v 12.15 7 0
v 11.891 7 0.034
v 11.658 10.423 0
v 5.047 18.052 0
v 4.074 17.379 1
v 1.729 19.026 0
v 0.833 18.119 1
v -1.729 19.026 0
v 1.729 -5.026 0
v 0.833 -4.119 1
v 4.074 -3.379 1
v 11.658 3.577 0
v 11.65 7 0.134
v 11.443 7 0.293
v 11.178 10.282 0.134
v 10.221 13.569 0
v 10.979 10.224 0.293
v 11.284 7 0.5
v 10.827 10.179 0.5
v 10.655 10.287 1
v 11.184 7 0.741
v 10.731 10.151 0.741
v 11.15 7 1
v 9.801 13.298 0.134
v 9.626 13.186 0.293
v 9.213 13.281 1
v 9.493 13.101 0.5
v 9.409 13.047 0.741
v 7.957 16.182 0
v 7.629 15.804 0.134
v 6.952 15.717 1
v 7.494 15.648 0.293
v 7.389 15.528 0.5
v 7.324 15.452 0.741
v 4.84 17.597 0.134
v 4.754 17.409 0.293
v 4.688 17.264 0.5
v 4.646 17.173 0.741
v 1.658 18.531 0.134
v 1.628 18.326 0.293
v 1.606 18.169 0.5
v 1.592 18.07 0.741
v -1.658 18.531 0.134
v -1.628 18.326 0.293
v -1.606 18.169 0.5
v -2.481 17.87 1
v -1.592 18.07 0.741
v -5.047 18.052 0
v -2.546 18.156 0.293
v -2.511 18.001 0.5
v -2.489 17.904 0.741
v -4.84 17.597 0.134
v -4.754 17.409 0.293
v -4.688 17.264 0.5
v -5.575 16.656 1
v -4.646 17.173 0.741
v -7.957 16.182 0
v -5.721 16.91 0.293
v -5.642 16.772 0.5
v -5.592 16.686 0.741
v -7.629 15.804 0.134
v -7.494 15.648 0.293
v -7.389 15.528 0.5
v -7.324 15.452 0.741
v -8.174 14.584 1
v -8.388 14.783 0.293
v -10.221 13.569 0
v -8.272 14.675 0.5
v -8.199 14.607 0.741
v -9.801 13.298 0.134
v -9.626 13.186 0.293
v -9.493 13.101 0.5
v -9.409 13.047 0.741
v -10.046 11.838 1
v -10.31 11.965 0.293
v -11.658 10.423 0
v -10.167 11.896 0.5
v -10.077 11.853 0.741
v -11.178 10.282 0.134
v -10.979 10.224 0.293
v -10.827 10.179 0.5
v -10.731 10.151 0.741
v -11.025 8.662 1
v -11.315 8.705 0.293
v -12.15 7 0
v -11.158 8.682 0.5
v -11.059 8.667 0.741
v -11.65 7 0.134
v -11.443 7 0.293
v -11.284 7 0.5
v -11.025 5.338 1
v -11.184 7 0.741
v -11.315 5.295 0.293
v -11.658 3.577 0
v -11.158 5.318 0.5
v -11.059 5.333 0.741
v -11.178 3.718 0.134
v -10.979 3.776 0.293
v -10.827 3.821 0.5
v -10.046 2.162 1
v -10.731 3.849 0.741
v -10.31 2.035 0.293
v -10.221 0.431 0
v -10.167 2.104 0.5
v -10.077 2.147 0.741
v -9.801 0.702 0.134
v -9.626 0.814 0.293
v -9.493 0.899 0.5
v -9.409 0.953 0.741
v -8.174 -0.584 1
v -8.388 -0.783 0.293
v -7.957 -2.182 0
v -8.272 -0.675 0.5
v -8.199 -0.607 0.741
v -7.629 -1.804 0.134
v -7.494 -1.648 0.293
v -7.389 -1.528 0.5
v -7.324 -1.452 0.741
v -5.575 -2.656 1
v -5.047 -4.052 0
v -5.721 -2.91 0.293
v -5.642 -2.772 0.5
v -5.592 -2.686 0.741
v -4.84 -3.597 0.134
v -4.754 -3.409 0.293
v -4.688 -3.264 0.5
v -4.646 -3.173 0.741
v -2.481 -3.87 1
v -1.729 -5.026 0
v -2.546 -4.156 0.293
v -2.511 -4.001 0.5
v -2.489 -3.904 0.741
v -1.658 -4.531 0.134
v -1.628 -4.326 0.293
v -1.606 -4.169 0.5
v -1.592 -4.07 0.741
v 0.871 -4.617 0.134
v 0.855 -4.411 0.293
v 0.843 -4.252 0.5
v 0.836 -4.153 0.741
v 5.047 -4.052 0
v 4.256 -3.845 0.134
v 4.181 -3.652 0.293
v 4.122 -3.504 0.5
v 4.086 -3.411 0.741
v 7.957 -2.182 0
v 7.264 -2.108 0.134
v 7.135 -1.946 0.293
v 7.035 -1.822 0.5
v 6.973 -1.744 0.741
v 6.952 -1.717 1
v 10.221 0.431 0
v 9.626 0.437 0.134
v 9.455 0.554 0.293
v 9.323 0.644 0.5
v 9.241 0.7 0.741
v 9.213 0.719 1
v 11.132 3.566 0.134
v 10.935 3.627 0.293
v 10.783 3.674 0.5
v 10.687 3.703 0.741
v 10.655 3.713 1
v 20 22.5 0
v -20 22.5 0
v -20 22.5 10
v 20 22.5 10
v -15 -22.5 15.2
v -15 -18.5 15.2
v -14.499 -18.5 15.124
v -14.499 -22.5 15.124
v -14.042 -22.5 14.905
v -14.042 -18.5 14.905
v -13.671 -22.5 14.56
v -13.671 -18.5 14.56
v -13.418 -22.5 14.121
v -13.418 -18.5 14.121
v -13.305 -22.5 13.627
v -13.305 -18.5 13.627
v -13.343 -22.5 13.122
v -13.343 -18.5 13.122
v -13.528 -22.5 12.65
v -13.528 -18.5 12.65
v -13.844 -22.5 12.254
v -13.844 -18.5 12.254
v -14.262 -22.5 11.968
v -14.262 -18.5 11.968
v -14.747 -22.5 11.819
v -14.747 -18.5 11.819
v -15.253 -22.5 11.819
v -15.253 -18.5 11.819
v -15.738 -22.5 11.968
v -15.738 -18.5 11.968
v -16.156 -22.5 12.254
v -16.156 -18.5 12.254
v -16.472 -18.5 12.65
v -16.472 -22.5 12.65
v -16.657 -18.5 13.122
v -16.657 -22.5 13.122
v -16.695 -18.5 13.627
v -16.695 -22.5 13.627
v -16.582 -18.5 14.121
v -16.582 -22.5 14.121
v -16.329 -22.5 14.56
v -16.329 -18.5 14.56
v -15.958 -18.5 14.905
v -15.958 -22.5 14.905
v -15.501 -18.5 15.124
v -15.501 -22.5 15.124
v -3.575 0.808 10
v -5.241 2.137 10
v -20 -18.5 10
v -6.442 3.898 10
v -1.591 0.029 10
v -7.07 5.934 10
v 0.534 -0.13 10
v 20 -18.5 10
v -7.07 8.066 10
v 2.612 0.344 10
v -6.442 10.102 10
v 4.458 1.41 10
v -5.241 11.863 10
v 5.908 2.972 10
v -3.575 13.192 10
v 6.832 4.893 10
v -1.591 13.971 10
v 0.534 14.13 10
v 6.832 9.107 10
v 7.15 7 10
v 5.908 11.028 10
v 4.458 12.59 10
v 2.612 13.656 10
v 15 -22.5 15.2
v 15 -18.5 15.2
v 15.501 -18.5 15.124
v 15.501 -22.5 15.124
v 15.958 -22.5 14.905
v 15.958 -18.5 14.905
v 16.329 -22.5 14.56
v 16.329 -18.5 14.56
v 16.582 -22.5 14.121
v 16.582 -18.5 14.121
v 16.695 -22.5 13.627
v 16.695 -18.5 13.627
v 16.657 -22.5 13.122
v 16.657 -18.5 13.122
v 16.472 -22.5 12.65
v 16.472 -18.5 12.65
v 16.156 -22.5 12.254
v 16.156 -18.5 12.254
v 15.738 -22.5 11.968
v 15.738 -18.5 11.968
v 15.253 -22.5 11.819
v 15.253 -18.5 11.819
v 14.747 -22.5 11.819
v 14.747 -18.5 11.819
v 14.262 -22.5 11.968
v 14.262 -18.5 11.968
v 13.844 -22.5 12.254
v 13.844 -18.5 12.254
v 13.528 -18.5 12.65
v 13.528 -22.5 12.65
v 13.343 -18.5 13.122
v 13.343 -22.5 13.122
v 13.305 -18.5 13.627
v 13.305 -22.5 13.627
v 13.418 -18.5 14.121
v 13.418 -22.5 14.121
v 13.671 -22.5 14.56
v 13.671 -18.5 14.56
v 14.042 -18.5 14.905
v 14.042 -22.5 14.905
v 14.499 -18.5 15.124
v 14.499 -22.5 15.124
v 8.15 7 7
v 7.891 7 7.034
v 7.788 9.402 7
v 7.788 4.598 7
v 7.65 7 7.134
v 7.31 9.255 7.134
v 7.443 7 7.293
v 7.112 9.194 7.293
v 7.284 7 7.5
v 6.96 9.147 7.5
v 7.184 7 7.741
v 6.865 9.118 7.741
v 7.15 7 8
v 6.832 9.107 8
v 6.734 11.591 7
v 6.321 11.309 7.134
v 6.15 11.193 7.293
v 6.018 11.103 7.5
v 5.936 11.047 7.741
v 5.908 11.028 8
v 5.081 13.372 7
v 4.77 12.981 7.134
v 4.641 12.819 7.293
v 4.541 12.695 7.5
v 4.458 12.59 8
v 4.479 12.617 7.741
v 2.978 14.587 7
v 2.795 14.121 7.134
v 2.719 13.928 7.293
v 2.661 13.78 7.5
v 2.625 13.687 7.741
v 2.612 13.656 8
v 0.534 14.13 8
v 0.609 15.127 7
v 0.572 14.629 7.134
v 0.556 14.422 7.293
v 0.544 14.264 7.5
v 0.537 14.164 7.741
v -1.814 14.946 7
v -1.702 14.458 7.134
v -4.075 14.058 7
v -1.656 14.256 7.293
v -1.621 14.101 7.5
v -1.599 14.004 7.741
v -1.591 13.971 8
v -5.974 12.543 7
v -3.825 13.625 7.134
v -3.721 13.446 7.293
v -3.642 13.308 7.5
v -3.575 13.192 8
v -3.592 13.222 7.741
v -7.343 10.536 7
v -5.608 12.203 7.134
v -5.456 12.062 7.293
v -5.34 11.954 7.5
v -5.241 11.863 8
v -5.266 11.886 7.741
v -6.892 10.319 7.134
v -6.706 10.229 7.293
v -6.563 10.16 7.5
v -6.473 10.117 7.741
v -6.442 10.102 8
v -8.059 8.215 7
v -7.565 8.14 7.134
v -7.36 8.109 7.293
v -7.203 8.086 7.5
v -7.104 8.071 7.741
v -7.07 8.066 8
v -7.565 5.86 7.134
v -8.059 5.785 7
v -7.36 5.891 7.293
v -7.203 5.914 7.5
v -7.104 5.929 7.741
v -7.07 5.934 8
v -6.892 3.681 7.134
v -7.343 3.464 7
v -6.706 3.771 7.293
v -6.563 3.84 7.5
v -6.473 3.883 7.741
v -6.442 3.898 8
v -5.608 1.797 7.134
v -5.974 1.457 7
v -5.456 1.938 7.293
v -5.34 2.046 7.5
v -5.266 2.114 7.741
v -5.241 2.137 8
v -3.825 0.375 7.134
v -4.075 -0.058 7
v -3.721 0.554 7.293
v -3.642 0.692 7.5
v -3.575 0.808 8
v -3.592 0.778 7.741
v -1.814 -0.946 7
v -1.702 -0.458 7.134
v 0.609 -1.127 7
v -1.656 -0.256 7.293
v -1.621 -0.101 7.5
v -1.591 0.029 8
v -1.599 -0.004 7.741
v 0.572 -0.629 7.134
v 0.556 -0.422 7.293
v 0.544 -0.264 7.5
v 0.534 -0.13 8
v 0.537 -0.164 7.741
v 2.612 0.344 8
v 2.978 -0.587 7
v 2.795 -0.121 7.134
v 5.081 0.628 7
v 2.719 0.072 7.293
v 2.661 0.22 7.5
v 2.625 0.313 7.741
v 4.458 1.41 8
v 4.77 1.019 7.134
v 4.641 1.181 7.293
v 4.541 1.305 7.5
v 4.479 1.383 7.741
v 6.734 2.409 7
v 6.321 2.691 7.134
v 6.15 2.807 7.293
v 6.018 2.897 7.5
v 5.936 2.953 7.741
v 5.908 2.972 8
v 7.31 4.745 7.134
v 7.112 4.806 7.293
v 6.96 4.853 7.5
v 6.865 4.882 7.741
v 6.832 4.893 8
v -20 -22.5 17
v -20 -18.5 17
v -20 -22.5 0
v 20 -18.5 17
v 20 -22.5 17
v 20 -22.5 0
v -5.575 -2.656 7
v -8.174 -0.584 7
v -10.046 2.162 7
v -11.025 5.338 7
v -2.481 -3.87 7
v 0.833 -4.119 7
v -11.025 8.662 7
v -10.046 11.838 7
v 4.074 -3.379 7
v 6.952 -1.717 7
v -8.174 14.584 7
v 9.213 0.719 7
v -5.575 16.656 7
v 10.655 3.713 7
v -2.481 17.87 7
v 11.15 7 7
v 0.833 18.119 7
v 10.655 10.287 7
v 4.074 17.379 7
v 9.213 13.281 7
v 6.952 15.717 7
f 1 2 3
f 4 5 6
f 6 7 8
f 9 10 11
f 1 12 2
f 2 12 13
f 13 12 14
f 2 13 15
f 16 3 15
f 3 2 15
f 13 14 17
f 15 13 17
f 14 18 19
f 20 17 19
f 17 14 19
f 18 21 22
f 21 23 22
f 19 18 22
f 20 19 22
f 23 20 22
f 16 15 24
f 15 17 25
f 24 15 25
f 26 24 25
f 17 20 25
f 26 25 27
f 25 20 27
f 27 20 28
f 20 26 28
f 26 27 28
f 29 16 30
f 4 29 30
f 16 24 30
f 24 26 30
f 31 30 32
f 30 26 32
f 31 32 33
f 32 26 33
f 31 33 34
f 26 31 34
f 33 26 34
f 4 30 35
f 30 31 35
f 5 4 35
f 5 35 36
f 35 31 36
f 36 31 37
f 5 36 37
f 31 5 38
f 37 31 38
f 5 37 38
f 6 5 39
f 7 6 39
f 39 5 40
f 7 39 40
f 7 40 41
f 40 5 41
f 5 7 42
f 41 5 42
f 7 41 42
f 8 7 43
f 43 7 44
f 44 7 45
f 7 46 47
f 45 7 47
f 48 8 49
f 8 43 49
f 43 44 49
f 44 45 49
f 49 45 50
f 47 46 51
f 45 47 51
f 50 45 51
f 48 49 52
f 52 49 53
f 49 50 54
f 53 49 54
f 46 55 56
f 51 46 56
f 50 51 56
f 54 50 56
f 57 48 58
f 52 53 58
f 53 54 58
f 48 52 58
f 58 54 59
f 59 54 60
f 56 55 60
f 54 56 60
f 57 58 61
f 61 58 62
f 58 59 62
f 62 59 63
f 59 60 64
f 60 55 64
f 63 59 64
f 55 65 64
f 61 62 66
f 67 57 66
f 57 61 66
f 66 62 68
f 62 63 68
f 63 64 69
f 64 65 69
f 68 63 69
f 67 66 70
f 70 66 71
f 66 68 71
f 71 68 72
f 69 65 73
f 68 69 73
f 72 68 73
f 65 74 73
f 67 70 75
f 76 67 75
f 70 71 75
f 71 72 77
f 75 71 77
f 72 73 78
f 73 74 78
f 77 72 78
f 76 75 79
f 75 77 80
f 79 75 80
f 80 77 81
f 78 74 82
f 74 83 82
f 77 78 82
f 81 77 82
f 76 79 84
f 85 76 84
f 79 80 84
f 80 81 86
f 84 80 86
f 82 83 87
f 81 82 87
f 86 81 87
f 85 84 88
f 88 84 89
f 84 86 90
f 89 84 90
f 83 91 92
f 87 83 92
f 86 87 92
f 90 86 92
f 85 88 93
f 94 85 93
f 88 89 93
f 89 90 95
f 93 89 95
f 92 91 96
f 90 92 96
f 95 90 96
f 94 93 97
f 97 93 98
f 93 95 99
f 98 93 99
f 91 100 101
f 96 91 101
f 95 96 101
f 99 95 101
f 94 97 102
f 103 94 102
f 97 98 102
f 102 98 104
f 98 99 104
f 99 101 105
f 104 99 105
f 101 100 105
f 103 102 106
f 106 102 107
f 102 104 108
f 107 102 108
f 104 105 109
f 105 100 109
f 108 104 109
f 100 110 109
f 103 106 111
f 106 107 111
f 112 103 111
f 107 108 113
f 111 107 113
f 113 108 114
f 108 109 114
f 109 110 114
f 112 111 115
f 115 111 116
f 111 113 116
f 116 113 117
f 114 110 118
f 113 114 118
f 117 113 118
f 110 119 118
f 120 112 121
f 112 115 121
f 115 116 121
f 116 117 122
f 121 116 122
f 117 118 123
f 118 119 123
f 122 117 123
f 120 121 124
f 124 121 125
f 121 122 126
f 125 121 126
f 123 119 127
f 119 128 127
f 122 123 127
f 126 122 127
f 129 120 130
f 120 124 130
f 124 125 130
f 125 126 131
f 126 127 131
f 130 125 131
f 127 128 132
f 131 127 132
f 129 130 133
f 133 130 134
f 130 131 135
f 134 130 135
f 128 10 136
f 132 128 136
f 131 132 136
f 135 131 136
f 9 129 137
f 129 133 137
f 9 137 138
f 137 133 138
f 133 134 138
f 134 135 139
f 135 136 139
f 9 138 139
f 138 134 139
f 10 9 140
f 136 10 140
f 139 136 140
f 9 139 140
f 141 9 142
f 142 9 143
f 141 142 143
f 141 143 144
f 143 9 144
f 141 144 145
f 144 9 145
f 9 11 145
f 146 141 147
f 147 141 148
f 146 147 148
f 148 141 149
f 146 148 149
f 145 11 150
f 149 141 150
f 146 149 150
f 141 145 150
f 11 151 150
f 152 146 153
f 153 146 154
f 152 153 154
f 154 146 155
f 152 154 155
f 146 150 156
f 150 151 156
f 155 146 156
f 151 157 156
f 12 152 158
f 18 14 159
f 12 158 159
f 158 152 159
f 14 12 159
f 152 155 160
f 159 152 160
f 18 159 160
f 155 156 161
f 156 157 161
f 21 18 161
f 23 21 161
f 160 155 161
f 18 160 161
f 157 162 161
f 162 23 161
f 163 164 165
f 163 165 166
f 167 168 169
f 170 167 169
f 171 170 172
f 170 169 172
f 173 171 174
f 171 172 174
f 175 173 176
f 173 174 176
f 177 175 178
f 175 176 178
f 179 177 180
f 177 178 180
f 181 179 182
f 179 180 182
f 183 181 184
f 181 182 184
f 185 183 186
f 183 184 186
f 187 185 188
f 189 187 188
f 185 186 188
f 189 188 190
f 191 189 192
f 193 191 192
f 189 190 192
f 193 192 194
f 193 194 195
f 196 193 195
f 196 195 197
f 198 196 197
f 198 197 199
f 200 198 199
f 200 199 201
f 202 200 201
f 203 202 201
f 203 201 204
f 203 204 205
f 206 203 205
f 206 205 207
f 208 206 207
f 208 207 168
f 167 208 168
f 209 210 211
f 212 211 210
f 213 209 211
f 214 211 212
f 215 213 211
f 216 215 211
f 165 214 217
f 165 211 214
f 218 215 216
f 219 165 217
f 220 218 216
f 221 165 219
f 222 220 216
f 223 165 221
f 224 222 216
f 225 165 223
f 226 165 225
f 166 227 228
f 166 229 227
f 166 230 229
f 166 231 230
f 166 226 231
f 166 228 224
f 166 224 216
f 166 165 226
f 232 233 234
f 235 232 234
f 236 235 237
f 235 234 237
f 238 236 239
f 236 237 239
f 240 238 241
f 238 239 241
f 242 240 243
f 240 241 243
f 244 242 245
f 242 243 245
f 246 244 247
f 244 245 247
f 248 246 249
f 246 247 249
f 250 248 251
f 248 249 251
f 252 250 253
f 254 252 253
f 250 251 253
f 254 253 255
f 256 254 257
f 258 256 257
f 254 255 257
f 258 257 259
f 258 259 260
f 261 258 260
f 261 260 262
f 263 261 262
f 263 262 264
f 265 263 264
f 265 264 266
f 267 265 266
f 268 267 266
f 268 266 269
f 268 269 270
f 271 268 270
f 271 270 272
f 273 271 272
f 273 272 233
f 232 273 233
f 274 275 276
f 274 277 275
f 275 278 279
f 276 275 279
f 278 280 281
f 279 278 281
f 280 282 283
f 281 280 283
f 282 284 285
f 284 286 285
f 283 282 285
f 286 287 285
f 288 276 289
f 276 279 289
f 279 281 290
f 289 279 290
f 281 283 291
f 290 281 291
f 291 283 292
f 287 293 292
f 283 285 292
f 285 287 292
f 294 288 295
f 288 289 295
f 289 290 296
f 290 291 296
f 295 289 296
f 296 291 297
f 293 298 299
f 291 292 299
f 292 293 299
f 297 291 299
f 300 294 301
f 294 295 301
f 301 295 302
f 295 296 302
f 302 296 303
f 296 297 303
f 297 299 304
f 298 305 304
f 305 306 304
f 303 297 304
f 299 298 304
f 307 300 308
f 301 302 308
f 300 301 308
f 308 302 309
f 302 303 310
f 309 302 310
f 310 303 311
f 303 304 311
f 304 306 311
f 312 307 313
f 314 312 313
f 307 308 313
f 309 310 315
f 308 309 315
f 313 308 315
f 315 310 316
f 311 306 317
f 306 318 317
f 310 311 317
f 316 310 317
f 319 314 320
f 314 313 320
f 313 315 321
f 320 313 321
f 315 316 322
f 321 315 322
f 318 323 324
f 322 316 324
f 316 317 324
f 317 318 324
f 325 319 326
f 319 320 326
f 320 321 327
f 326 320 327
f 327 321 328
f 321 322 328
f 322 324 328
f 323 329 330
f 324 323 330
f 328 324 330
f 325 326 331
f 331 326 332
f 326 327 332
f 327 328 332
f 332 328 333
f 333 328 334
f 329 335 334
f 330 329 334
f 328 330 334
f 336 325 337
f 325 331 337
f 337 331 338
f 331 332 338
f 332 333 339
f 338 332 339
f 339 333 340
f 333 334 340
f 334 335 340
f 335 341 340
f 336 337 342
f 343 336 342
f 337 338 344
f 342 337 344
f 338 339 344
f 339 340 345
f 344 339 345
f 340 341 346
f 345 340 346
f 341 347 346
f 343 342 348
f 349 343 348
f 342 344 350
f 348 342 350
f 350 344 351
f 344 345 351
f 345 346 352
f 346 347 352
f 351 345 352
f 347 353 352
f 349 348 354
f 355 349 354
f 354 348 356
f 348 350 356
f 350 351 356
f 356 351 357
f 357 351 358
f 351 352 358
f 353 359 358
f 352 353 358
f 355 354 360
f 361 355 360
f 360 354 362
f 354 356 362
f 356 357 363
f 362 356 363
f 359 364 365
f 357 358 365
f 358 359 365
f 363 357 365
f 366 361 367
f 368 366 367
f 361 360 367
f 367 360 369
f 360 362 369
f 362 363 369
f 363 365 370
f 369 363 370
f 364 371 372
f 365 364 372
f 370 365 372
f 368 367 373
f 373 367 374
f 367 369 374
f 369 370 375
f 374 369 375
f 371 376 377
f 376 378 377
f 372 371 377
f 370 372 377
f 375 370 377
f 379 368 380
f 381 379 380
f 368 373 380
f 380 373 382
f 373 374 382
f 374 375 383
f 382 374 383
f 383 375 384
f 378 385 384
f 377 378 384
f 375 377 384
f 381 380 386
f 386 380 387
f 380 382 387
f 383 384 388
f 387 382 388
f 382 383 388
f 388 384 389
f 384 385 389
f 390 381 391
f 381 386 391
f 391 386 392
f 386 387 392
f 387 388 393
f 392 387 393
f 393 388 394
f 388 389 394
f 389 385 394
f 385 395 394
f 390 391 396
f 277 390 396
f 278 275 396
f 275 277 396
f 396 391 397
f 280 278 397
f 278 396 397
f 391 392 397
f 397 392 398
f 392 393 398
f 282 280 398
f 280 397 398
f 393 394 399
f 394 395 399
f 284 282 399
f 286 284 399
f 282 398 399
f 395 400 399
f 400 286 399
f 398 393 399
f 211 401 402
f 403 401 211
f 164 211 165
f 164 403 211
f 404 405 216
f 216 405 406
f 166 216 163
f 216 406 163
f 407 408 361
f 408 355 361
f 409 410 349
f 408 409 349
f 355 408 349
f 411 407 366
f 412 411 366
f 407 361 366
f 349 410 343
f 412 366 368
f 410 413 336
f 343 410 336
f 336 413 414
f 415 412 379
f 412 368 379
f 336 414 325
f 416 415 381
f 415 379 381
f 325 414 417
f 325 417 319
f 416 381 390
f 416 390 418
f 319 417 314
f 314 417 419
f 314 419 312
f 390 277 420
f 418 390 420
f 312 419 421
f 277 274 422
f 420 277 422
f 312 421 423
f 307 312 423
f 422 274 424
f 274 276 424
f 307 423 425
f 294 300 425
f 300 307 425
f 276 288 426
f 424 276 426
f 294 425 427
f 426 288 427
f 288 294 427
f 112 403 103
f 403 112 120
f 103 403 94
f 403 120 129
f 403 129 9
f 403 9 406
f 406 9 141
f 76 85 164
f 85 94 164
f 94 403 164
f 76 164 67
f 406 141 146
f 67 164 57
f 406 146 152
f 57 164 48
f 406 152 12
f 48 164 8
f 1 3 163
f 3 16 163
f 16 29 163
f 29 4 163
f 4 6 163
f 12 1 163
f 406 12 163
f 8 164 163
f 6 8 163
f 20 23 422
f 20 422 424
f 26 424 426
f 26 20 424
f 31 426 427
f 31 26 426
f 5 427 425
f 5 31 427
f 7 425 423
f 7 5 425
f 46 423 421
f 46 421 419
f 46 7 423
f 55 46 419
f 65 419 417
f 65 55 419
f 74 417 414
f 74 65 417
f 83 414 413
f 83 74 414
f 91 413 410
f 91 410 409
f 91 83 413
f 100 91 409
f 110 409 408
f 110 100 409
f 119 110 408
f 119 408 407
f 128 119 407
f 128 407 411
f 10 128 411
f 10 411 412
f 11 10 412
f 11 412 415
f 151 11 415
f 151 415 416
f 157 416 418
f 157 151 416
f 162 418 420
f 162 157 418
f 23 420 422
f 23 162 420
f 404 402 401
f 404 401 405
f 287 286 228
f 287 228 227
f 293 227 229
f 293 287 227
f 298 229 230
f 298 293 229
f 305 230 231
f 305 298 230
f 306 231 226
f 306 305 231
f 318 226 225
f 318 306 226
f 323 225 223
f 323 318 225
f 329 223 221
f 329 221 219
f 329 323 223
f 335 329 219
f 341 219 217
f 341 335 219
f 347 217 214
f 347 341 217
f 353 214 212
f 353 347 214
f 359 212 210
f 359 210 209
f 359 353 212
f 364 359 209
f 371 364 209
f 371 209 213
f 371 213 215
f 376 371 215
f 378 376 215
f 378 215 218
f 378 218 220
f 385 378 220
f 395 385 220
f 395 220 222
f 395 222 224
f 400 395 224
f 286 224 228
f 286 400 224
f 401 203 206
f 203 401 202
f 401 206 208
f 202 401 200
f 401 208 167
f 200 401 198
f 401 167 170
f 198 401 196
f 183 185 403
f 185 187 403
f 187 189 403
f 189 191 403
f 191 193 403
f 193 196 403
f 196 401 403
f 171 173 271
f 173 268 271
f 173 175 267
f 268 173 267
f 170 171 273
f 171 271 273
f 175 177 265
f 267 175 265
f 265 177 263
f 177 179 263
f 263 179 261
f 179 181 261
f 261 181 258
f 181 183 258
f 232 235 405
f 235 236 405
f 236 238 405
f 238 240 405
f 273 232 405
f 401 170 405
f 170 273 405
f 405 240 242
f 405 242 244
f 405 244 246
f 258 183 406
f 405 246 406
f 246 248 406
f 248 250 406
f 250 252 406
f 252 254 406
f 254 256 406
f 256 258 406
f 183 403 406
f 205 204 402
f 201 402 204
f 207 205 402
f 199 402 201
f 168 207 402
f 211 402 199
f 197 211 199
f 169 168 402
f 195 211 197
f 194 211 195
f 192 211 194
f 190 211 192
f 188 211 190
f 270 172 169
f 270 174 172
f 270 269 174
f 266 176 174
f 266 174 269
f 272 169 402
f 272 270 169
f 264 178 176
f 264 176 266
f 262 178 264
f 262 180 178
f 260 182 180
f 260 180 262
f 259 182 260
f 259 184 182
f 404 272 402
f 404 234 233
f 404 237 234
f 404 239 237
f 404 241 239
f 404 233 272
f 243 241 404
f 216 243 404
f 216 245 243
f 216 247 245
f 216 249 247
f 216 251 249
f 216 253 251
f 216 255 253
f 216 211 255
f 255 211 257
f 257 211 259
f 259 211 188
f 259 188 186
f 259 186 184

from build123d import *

# Parameters (mm, degrees)
SKETCH1_W           = 40
SKETCH1_H           = 45
SKETCH1_R           = 11.15
BOSS_EXTRUDE1_DEPTH = 7
SKETCH2_W           = 40
SKETCH2_H           = 45
SKETCH2_R           = 7.15
BOSS_EXTRUDE2_DEPTH = 3
FILLET1_R           = 1
SKETCH3_W           = 40
SKETCH3_H           = 4
BOSS_EXTRUDE3_DEPTH = 7
SKETCH4_R           = 1.7
CUT_EXTRUDE1_DEPTH  = 49.682645779


with BuildPart() as part:
    # Sketch1 → Boss-Extrude1 (new body)
    with BuildSketch(Plane.XY):
        Rectangle(SKETCH1_W, SKETCH1_H)
        with Locations((0, 7)):
            Circle(SKETCH1_R, mode=Mode.SUBTRACT)
    extrude(amount=BOSS_EXTRUDE1_DEPTH)

    # Sketch2 → Boss-Extrude2 (add)
    with BuildSketch(Plane.XY.offset(7)):
        Rectangle(SKETCH2_W, SKETCH2_H)
        with Locations((0, 7)):
            Circle(SKETCH2_R, mode=Mode.SUBTRACT)
    extrude(amount=BOSS_EXTRUDE2_DEPTH)

    # Fillet1
    fillet1_edges = [part.edges().sort_by_distance(p)[0] for p in [
        (-11.15, 7, 0),
        (-7.15, 7, 7),
    ]]
    fillet(fillet1_edges, radius=FILLET1_R)

    # Sketch3 → Boss-Extrude3 (add)
    with BuildSketch(Plane.XY.offset(10)):
        with Locations((0, -20.5)):
            Rectangle(SKETCH3_W, SKETCH3_H)
    extrude(amount=BOSS_EXTRUDE3_DEPTH)

    # Sketch4 → Cut-Extrude1 (cut, through all)
    with BuildSketch(Plane(origin=(0, -18.5, 0), x_dir=(1, 0, 0), z_dir=(0, 1, 0))):
        with Locations(Location((-15, -13.5, 0), (0, 0, 270))):
            Circle(SKETCH4_R)
        with Locations(Location((15, -13.5, 0), (0, 0, 270))):
            Circle(SKETCH4_R)
    extrude(amount=-CUT_EXTRUDE1_DEPTH, mode=Mode.SUBTRACT)


solid = part.part
